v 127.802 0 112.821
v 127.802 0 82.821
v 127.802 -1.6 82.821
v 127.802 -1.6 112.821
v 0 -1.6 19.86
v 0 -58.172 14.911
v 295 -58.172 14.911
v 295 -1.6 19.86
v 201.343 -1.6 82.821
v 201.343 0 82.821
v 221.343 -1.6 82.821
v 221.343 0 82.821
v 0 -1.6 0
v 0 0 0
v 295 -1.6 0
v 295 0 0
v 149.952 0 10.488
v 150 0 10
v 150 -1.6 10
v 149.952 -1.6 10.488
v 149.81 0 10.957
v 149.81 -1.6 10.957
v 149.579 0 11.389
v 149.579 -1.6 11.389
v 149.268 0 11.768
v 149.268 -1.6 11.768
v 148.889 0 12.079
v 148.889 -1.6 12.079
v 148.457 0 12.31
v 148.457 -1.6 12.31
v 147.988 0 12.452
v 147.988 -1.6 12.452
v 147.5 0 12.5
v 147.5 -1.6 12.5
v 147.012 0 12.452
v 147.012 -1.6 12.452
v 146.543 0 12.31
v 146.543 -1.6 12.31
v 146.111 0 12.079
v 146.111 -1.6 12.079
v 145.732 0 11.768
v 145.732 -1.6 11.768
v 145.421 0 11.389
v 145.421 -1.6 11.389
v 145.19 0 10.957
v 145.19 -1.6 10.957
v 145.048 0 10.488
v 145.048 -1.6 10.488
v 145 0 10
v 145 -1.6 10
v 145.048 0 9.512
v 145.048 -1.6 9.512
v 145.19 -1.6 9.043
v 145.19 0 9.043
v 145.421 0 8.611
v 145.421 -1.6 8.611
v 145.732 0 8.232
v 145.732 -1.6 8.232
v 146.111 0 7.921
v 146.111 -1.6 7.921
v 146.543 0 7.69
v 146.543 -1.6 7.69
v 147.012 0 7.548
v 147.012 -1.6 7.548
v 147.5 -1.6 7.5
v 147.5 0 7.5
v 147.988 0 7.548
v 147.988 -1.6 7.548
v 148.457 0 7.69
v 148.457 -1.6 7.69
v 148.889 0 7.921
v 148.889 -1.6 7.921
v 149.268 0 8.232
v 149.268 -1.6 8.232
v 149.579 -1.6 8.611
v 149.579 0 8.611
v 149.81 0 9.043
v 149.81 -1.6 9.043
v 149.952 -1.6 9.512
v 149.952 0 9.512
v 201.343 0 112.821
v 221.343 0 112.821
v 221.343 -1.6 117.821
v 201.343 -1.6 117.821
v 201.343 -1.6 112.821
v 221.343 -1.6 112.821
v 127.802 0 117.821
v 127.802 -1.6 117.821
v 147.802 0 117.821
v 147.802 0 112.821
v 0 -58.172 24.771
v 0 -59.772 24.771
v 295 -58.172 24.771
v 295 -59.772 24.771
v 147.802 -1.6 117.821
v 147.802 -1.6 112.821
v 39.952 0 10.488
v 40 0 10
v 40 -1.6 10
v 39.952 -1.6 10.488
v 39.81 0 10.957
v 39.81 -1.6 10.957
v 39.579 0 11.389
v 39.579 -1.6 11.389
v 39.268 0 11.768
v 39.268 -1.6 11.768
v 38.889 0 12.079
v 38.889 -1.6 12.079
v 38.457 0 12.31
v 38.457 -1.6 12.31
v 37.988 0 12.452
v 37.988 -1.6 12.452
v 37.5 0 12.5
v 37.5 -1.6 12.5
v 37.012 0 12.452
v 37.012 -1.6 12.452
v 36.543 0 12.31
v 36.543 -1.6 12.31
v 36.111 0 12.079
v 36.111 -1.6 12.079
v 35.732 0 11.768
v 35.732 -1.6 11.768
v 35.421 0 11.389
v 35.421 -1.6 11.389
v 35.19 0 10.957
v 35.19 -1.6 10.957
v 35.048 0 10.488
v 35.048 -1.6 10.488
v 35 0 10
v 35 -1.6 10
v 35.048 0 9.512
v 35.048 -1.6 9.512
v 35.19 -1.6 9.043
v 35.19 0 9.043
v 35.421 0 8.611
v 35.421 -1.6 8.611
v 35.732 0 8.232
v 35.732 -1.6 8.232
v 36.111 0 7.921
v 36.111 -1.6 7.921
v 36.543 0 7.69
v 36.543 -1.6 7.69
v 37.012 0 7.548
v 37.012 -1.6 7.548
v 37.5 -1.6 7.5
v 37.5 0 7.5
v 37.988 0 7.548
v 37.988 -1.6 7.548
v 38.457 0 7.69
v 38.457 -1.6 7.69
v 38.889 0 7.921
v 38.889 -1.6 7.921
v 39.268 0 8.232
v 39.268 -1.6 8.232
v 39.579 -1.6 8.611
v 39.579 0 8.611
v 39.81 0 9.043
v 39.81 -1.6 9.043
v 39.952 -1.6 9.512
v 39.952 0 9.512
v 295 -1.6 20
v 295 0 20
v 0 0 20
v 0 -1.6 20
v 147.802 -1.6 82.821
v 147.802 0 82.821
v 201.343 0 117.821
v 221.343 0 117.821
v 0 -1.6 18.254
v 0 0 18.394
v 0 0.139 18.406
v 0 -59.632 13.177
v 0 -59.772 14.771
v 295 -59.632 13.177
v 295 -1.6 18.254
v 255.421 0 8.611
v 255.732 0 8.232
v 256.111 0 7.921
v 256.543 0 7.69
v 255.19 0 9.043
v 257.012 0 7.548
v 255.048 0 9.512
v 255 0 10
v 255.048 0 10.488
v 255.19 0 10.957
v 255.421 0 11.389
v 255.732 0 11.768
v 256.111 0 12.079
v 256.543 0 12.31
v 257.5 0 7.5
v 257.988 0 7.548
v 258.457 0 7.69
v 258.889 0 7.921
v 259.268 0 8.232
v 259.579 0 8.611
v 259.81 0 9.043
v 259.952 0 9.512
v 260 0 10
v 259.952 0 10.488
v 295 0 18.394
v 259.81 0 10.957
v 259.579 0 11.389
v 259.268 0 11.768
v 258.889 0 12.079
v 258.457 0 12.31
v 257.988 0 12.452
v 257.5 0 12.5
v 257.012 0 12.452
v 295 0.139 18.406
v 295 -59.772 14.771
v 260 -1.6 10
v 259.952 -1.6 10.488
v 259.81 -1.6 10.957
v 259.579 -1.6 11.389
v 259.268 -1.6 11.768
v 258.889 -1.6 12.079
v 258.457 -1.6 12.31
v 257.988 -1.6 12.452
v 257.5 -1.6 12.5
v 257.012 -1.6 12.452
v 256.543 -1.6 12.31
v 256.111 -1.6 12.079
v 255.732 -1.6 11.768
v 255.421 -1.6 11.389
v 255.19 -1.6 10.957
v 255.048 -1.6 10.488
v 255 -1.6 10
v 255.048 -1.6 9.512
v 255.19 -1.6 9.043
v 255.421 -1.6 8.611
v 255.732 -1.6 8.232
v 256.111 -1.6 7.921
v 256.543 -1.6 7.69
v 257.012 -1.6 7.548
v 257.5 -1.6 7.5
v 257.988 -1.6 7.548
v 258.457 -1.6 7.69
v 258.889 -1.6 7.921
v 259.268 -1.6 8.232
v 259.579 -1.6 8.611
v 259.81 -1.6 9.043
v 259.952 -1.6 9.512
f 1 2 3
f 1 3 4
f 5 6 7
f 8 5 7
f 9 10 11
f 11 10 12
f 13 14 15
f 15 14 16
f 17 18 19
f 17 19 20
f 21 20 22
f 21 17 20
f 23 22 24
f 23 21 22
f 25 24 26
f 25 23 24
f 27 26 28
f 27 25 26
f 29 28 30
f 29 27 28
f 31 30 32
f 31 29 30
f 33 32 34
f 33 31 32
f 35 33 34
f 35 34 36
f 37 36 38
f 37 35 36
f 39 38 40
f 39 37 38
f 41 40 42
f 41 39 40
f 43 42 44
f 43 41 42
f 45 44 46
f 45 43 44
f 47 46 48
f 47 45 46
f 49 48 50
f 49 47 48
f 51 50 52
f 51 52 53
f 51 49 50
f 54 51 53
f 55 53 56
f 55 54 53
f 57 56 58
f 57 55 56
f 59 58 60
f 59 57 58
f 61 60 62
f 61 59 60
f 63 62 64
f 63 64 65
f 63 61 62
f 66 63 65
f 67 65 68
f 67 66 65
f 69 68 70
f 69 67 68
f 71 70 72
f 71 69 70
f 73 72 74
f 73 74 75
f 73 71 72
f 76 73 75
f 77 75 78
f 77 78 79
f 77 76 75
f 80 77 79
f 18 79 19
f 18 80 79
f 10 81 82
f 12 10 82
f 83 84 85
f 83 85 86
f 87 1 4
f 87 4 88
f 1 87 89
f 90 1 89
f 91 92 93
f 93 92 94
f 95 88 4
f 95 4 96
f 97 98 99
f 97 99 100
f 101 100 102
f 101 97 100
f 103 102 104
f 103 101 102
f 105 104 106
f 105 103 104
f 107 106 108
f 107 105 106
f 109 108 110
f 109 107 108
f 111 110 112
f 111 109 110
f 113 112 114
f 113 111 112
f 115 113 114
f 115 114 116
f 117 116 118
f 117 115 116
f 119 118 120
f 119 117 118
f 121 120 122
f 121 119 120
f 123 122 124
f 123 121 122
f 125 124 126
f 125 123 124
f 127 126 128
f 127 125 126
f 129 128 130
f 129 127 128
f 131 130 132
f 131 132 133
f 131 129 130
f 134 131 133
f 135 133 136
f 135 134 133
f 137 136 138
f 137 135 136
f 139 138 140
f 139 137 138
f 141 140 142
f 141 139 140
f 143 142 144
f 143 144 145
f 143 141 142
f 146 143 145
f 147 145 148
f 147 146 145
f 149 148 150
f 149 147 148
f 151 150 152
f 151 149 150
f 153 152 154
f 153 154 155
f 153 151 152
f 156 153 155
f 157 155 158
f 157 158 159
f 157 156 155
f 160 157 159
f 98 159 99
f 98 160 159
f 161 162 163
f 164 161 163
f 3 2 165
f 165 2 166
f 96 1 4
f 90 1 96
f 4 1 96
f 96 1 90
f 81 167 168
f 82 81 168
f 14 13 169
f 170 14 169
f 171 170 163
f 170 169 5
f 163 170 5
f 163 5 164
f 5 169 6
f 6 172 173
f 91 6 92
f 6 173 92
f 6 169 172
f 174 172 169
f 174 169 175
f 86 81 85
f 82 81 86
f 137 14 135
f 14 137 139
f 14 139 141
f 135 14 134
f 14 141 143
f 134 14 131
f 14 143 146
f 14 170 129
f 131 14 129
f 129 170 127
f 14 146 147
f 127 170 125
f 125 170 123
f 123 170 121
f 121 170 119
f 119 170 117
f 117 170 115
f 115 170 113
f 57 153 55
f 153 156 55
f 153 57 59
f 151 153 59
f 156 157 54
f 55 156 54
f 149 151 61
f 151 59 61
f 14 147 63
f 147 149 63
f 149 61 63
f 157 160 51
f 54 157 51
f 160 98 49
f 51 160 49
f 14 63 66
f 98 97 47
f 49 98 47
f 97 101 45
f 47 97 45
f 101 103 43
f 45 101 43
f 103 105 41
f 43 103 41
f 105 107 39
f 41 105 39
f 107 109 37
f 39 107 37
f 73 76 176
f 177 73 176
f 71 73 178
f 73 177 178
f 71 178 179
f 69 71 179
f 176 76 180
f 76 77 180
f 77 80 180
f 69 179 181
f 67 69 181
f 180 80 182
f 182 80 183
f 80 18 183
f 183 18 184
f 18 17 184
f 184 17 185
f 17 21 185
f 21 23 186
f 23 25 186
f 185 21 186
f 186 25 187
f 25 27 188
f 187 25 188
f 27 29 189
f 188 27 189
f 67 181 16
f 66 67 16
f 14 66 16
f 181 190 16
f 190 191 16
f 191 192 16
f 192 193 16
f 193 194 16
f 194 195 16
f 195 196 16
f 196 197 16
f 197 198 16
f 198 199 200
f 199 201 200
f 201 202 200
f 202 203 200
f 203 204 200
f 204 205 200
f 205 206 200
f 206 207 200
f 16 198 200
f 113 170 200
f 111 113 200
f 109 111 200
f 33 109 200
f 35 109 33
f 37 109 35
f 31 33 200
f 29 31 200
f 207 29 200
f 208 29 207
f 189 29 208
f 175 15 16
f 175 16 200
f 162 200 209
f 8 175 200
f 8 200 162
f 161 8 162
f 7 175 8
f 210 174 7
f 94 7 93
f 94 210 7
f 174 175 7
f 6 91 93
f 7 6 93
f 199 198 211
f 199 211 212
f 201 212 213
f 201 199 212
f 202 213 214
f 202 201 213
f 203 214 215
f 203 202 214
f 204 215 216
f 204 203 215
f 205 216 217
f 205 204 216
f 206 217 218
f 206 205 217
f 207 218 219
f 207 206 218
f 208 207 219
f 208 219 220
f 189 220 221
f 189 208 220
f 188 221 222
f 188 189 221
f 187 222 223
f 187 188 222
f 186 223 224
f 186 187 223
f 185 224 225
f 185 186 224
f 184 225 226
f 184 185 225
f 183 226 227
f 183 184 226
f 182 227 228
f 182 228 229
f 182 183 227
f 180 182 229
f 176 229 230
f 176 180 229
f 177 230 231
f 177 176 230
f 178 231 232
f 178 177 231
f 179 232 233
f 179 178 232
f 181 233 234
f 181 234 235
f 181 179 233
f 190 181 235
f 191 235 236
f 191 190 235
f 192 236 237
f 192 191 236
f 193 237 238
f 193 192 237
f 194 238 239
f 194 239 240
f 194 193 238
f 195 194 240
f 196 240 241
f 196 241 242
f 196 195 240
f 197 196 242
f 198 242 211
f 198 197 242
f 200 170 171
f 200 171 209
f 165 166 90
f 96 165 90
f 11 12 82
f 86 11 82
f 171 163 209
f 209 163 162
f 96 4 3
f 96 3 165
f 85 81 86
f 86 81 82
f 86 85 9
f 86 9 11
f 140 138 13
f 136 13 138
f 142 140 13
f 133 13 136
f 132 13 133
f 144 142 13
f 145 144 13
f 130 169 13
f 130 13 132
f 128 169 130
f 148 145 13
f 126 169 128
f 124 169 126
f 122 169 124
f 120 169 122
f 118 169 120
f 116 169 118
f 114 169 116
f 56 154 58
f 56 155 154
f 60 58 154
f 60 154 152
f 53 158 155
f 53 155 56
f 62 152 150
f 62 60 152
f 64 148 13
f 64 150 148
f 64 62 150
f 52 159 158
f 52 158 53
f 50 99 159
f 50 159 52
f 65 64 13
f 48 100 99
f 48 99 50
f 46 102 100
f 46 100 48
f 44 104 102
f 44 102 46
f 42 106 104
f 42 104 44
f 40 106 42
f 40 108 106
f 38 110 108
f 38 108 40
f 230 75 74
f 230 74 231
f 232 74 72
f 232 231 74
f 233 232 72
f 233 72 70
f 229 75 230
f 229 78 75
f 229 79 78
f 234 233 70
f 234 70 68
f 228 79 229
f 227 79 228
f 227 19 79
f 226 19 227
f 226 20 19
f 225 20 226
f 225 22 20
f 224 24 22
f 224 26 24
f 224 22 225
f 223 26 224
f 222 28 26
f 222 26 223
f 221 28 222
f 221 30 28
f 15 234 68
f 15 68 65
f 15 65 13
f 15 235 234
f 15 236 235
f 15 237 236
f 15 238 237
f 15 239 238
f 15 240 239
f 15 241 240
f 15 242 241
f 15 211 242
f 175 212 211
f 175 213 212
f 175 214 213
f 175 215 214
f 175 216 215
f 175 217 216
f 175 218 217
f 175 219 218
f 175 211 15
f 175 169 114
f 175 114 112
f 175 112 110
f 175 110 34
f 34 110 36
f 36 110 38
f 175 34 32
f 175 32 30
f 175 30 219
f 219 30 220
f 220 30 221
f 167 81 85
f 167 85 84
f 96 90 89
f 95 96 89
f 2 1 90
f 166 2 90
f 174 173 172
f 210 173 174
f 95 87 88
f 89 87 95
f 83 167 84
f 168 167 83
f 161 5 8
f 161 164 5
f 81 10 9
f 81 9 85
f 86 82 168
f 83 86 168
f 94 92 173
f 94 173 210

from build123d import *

# Parameters (mm, degrees)
F0_W      = 20
F0_H      = 20
F0_W_2    = 255
F0_R      = 2.5
F6_DEPTH  = 1.6
F2_W      = 295
F2_H      = 60
F7_DEPTH  = 1.6
F4_W      = 295
F4_H      = 10
F8_DEPTH  = 1.6
F5_W      = 20
F5_H      = 30
F9_DEPTH  = 1.6
F5_H_2    = 5
F10_DEPTH = 1.6


with BuildPart() as f6:
    # F0 (on Front) → F6 (new body)
    with BuildSketch(Plane.XZ):
        with Locations((285, 10)):
            Rectangle(F0_W, F0_H)
        with Locations((147.5, 10)):
            Rectangle(F0_W_2, F0_H)
        with Locations((37.5, 10)):
            Circle(F0_R, mode=Mode.SUBTRACT)
        with Locations((147.5, 10)):
            Circle(F0_R, mode=Mode.SUBTRACT)
        with Locations((257.5, 10)):
            Circle(F0_R, mode=Mode.SUBTRACT)
        with Locations((10, 10)):
            Rectangle(F0_W, F0_H)
    extrude(amount=F6_DEPTH)

    # F2 (on face) → F7 (join)
    with BuildSketch(Plane(origin=(0, -1.736482, 19.848078), x_dir=(1, 0, 0), z_dir=(0, 0.087156, -0.996195))):
        with Locations((147.5, 28.256885)):
            Rectangle(F2_W, F2_H)
    extrude(amount=F7_DEPTH)

    # F4 (on face) → F8 (join)
    with BuildSketch(Plane.XZ.offset(59.771682)):
        with Locations((147.5, 19.770655)):
            Rectangle(F4_W, F4_H)
    extrude(amount=-F8_DEPTH)


with BuildPart() as f9:
    # F5 (on Front) → F9 (new body)
    with BuildSketch(Plane.XZ):
        with Locations((137.801906, 97.820768)):
            Rectangle(F5_W, F5_H)
        with Locations((211.342821, 97.820768)):
            Rectangle(F5_W, F5_H)
    extrude(amount=F9_DEPTH)


with BuildPart() as f10:
    # F5 (on Front) → F10 (new body)
    with BuildSketch(Plane.XZ):
        with Locations((137.801906, 115.320768)):
            Rectangle(F5_W, F5_H_2)
        with Locations((211.342821, 115.320768)):
            Rectangle(F5_W, F5_H_2)
    extrude(amount=F10_DEPTH)


solid = Compound([f6.part, f9.part, f10.part])
